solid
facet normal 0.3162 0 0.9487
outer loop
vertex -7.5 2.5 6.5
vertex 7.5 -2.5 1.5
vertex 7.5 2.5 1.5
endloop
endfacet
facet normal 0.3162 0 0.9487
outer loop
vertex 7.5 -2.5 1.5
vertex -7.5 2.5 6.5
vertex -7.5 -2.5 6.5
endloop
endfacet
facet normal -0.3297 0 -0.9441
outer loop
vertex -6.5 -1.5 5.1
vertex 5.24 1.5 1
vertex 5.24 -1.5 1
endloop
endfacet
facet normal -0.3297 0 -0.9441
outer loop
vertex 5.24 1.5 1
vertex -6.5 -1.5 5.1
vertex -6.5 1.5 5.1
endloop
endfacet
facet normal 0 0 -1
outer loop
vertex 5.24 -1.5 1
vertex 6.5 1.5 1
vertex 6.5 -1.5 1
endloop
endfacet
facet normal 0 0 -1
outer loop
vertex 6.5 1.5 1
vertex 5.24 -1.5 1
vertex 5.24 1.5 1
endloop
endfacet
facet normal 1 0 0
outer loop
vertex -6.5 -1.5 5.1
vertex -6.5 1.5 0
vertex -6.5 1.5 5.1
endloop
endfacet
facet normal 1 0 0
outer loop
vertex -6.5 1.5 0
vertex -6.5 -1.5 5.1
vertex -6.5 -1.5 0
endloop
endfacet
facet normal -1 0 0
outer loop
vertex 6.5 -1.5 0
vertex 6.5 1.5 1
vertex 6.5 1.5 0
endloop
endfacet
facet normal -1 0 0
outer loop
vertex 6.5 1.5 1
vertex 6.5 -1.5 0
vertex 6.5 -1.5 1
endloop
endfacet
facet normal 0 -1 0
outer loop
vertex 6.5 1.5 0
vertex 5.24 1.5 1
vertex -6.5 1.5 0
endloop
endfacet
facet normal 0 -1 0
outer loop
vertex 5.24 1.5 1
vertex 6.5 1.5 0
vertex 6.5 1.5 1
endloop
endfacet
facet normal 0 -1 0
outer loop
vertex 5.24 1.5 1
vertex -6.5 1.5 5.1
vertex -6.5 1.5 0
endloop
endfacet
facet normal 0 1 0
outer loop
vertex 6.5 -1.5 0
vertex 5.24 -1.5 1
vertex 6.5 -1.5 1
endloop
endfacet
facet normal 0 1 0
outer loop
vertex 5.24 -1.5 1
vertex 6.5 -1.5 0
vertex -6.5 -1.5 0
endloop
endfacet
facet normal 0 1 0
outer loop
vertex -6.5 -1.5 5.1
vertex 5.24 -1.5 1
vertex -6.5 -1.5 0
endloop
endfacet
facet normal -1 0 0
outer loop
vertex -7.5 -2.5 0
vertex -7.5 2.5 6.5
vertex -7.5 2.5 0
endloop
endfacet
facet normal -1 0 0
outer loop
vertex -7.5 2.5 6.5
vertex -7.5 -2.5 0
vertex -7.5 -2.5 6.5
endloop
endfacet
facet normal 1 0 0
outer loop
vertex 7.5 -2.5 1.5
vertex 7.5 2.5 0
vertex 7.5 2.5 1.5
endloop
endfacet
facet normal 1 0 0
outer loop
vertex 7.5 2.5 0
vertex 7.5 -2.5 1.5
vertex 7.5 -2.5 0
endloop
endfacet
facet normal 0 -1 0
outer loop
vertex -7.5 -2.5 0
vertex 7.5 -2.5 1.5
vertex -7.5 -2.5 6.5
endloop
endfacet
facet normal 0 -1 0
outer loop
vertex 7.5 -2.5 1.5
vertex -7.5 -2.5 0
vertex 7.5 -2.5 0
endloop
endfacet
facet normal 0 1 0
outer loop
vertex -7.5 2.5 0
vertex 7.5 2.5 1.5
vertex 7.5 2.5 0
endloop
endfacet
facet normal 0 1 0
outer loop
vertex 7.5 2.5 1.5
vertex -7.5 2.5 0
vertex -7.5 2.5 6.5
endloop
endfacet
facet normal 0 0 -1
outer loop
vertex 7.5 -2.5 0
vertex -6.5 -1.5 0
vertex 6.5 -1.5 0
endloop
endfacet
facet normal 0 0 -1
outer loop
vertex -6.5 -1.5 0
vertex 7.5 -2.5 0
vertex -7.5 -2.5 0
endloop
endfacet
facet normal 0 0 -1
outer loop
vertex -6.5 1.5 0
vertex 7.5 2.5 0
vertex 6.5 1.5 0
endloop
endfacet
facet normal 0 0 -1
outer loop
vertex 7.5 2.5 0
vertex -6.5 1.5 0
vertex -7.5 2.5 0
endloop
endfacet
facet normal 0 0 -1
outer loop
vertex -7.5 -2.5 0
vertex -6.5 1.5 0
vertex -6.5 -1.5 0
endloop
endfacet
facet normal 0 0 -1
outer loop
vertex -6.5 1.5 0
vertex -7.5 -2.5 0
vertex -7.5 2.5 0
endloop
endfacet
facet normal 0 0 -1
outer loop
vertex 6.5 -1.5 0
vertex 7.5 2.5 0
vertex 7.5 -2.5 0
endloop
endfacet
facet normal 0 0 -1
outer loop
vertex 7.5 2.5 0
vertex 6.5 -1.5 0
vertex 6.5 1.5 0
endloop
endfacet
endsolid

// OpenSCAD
// file: ../p/rect3.scad
use <../lib.scad>
function ldraw_lib__rect3() = [
// 0 Rectangle with 3 Edges
// 0 Name: rect3.dat
// 0 Author: Mark Kennedy [mkennedy]
// 0 !LDRAW_ORG Primitive UPDATE 2010-01
// 0 !LICENSE Licensed under CC BY 4.0 : see CAreadme.txt
// 
// 0 BFC CERTIFY CCW
  [0,"BFC","CERTIFY"],
  [0,"BFC","CCW"],
// 
// 0 !HISTORY 2003-08-01 [PTadmin] Official Update 2003-02
// 0 !HISTORY 2007-06-24 [PTadmin] Header formatted for Contributor Agreement
// 0 !HISTORY 2008-07-01 [PTadmin] Official Update 2008-01
// 0 !HISTORY 2010-01-17 [mikeheide] Change winding to CCW
// 0 !HISTORY 2010-04-05 [PTadmin] Official Update 2010-01
// 
// 
// 2 24 1 0 1 -1 0 1
  [2,24,1,0,1,-1,0,1],
// 2 24 1 0 1 1 0 -1
  [2,24,1,0,1,1,0,-1],
// 2 24 -1 0 1 -1 0 -1
  [2,24,-1,0,1,-1,0,-1],
// 4 16 -1 0 1 -1 0 -1 1 0 -1 1 0 1
  [4,16,-1,0,1,-1,0,-1,1,0,-1,1,0,1],
// 0 //
];
module ldraw_lib__rect3(step=0, col=false, unit=2/5, alt=false, line=0.2, solid=!$preview)
    makepoly(ldraw_lib__rect3(), step=step, col=col, unit=unit, alt=alt, line=line, solid=solid);
ldraw_lib__rect3(line=0.2);
// file: ../p/rect.scad
use <../lib.scad>
function ldraw_lib__rect() = [
// 0 Rectangle
// 0 Name: rect.dat
// 0 Author: James Jessiman
// 0 !LDRAW_ORG Primitive UPDATE 2010-01
// 0 !LICENSE Licensed under CC BY 4.0 : see CAreadme.txt
// 
// 0 BFC CERTIFY CCW
  [0,"BFC","CERTIFY"],
  [0,"BFC","CCW"],
// 
// 0 !HISTORY 2002-04-05 [hafhead] Added BFC statement
// 0 !HISTORY 2002-04-25 [PTadmin] Official Update 2002-02
// 0 !HISTORY 2007-06-24 [PTadmin] Header formatted for Contributor Agreement
// 0 !HISTORY 2008-07-01 [PTadmin] Official Update 2008-01
// 0 !HISTORY 2010-01-17 [mikeheide] changed winding to CCW
// 0 !HISTORY 2010-04-05 [PTadmin] Official Update 2010-01
// 
// 
// 2 24 1 0 1 -1 0 1
  [2,24,1,0,1,-1,0,1],
// 2 24 -1 0 1 -1 0 -1
  [2,24,-1,0,1,-1,0,-1],
// 2 24 -1 0 -1 1 0 -1
  [2,24,-1,0,-1,1,0,-1],
// 2 24 1 0 -1 1 0 1
  [2,24,1,0,-1,1,0,1],
// 4 16 -1 0 1 -1 0 -1 1 0 -1 1 0 1
  [4,16,-1,0,1,-1,0,-1,1,0,-1,1,0,1],
// 0
];
module ldraw_lib__rect(step=0, col=false, unit=2/5, alt=false, line=0.2, solid=!$preview)
    makepoly(ldraw_lib__rect(), step=step, col=col, unit=unit, alt=alt, line=line, solid=solid);
ldraw_lib__rect(line=0.2);
// main file
use <../lib.scad>
use <../p/rect.scad>
use <../p/rect3.scad>
function ldraw_lib__u7032() = [
// 0 Modulex Slope Brick 18  3 x  1
// 0 Name: u7032.dat
// 0 Author: Magnus Forsberg [MagFors]
// 0 !LDRAW_ORG Part UPDATE 2025-09
// 0 !LICENSE Licensed under CC BY 4.0 : see CAreadme.txt
// 
// 0 BFC CERTIFY CCW
  [0,"BFC","CERTIFY"],
  [0,"BFC","CCW"],
// 
// 0 !KEYWORDS 18.4349 degree, Bricklink Mx1531, Peeron x718, Rebrickable 1531
// 0 !KEYWORDS slope 1:3
// 
// 0 !HISTORY 2025-06-07 [MagFors] Original design by Tore Eriksson as slp0103b
// 0 !HISTORY 2025-09-29 [OrionP] Official Update 2025-09
// 
// 1 16 0 -10 0 18.75 0 0 6.25 1 0 0 0 6.25 rect.dat
  [1,16,0,-10,0,18.75,0,0,6.25,1,0,0,0,6.25, ldraw_lib__rect()],
// 1 16 -1.575 -7.625 0 0 0 -14.675 0 -1 -5.125 -3.75 0 0 rect3.dat
  [1,16,-1.575,-7.625,0,0,0,-14.675,0,-1,-5.125,-3.75,0,0, ldraw_lib__rect3()],
// 1 16 14.675 -2.5 0 1.575 0 0 0 -1 0 0 0 -3.75 rect.dat
  [1,16,14.675,-2.5,0,1.575,0,0,0,-1,0,0,0,-3.75, ldraw_lib__rect()],
// 2 24 -18.75 0 -6.25 18.75 0 -6.25
  [2,24,-18.75,0,-6.25,18.75,0,-6.25],
// 2 24 -18.75 0 6.25 18.75 0 6.25
  [2,24,-18.75,0,6.25,18.75,0,6.25],
// 2 24 -16.25 0 -3.75 16.25 0 -3.75
  [2,24,-16.25,0,-3.75,16.25,0,-3.75],
// 2 24 -16.25 0 3.75 16.25 0 3.75
  [2,24,-16.25,0,3.75,16.25,0,3.75],
// 1 16 -16.25 -6.375 0 0 -1 0 0 0 6.375 -3.75 0 0 rect3.dat
  [1,16,-16.25,-6.375,0,0,-1,0,0,0,6.375,-3.75,0,0, ldraw_lib__rect3()],
// 1 16 16.25 -1.25 0 0 1 0 0 0 1.25 3.75 0 0 rect3.dat
  [1,16,16.25,-1.25,0,0,1,0,0,0,1.25,3.75,0,0, ldraw_lib__rect3()],
// 4 16 16.25 -2.5 3.75 13.1 -2.5 3.75 -16.25 0 3.75 16.25 0 3.75
  [4,16,16.25,-2.5,3.75,13.1,-2.5,3.75,-16.25,0,3.75,16.25,0,3.75],
// 3 16 13.1 -2.5 3.75 -16.25 -12.75 3.75 -16.25 0 3.75
  [3,16,13.1,-2.5,3.75,-16.25,-12.75,3.75,-16.25,0,3.75],
// 4 16 16.25 -2.5 -3.75 16.25 0 -3.75 -16.25 0 -3.75 13.1 -2.5 -3.75
  [4,16,16.25,-2.5,-3.75,16.25,0,-3.75,-16.25,0,-3.75,13.1,-2.5,-3.75],
// 3 16 -16.25 -12.75 -3.75 13.1 -2.5 -3.75 -16.25 0 -3.75
  [3,16,-16.25,-12.75,-3.75,13.1,-2.5,-3.75,-16.25,0,-3.75],
// 1 16 -18.75 -8.125 0 0 1 0 0 0 8.125 6.25 0 0 rect3.dat
  [1,16,-18.75,-8.125,0,0,1,0,0,0,8.125,6.25,0,0, ldraw_lib__rect3()],
// 1 16 18.75 -1.875 0 0 -1 0 0 0 1.875 -6.25 0 0 rect3.dat
  [1,16,18.75,-1.875,0,0,-1,0,0,0,1.875,-6.25,0,0, ldraw_lib__rect3()],
// 4 16 18.75 0 -6.25 18.75 -3.75 -6.25 -18.75 -16.25 -6.25 -18.75 0 -6.25
  [4,16,18.75,0,-6.25,18.75,-3.75,-6.25,-18.75,-16.25,-6.25,-18.75,0,-6.25],
// 4 16 -18.75 0 6.25 -18.75 -16.25 6.25 18.75 -3.75 6.25 18.75 0 6.25
  [4,16,-18.75,0,6.25,-18.75,-16.25,6.25,18.75,-3.75,6.25,18.75,0,6.25],
// 4 16 -16.25 0 -3.75 16.25 0 -3.75 18.75 0 -6.25 -18.75 0 -6.25
  [4,16,-16.25,0,-3.75,16.25,0,-3.75,18.75,0,-6.25,-18.75,0,-6.25],
// 4 16 18.75 0 6.25 16.25 0 3.75 -16.25 0 3.75 -18.75 0 6.25
  [4,16,18.75,0,6.25,16.25,0,3.75,-16.25,0,3.75,-18.75,0,6.25],
// 4 16 -18.75 0 6.25 -16.25 0 3.75 -16.25 0 -3.75 -18.75 0 -6.25
  [4,16,-18.75,0,6.25,-16.25,0,3.75,-16.25,0,-3.75,-18.75,0,-6.25],
// 4 16 16.25 0 -3.75 16.25 0 3.75 18.75 0 6.25 18.75 0 -6.25
  [4,16,16.25,0,-3.75,16.25,0,3.75,18.75,0,6.25,18.75,0,-6.25],
];
module ldraw_lib__u7032(step=0, col=false, unit=2/5, alt=false, line=0.2, solid=!$preview)
    makepoly(ldraw_lib__u7032(), step=step, col=col, unit=unit, alt=alt, line=line, solid=solid);
ldraw_lib__u7032(line=0.2);
